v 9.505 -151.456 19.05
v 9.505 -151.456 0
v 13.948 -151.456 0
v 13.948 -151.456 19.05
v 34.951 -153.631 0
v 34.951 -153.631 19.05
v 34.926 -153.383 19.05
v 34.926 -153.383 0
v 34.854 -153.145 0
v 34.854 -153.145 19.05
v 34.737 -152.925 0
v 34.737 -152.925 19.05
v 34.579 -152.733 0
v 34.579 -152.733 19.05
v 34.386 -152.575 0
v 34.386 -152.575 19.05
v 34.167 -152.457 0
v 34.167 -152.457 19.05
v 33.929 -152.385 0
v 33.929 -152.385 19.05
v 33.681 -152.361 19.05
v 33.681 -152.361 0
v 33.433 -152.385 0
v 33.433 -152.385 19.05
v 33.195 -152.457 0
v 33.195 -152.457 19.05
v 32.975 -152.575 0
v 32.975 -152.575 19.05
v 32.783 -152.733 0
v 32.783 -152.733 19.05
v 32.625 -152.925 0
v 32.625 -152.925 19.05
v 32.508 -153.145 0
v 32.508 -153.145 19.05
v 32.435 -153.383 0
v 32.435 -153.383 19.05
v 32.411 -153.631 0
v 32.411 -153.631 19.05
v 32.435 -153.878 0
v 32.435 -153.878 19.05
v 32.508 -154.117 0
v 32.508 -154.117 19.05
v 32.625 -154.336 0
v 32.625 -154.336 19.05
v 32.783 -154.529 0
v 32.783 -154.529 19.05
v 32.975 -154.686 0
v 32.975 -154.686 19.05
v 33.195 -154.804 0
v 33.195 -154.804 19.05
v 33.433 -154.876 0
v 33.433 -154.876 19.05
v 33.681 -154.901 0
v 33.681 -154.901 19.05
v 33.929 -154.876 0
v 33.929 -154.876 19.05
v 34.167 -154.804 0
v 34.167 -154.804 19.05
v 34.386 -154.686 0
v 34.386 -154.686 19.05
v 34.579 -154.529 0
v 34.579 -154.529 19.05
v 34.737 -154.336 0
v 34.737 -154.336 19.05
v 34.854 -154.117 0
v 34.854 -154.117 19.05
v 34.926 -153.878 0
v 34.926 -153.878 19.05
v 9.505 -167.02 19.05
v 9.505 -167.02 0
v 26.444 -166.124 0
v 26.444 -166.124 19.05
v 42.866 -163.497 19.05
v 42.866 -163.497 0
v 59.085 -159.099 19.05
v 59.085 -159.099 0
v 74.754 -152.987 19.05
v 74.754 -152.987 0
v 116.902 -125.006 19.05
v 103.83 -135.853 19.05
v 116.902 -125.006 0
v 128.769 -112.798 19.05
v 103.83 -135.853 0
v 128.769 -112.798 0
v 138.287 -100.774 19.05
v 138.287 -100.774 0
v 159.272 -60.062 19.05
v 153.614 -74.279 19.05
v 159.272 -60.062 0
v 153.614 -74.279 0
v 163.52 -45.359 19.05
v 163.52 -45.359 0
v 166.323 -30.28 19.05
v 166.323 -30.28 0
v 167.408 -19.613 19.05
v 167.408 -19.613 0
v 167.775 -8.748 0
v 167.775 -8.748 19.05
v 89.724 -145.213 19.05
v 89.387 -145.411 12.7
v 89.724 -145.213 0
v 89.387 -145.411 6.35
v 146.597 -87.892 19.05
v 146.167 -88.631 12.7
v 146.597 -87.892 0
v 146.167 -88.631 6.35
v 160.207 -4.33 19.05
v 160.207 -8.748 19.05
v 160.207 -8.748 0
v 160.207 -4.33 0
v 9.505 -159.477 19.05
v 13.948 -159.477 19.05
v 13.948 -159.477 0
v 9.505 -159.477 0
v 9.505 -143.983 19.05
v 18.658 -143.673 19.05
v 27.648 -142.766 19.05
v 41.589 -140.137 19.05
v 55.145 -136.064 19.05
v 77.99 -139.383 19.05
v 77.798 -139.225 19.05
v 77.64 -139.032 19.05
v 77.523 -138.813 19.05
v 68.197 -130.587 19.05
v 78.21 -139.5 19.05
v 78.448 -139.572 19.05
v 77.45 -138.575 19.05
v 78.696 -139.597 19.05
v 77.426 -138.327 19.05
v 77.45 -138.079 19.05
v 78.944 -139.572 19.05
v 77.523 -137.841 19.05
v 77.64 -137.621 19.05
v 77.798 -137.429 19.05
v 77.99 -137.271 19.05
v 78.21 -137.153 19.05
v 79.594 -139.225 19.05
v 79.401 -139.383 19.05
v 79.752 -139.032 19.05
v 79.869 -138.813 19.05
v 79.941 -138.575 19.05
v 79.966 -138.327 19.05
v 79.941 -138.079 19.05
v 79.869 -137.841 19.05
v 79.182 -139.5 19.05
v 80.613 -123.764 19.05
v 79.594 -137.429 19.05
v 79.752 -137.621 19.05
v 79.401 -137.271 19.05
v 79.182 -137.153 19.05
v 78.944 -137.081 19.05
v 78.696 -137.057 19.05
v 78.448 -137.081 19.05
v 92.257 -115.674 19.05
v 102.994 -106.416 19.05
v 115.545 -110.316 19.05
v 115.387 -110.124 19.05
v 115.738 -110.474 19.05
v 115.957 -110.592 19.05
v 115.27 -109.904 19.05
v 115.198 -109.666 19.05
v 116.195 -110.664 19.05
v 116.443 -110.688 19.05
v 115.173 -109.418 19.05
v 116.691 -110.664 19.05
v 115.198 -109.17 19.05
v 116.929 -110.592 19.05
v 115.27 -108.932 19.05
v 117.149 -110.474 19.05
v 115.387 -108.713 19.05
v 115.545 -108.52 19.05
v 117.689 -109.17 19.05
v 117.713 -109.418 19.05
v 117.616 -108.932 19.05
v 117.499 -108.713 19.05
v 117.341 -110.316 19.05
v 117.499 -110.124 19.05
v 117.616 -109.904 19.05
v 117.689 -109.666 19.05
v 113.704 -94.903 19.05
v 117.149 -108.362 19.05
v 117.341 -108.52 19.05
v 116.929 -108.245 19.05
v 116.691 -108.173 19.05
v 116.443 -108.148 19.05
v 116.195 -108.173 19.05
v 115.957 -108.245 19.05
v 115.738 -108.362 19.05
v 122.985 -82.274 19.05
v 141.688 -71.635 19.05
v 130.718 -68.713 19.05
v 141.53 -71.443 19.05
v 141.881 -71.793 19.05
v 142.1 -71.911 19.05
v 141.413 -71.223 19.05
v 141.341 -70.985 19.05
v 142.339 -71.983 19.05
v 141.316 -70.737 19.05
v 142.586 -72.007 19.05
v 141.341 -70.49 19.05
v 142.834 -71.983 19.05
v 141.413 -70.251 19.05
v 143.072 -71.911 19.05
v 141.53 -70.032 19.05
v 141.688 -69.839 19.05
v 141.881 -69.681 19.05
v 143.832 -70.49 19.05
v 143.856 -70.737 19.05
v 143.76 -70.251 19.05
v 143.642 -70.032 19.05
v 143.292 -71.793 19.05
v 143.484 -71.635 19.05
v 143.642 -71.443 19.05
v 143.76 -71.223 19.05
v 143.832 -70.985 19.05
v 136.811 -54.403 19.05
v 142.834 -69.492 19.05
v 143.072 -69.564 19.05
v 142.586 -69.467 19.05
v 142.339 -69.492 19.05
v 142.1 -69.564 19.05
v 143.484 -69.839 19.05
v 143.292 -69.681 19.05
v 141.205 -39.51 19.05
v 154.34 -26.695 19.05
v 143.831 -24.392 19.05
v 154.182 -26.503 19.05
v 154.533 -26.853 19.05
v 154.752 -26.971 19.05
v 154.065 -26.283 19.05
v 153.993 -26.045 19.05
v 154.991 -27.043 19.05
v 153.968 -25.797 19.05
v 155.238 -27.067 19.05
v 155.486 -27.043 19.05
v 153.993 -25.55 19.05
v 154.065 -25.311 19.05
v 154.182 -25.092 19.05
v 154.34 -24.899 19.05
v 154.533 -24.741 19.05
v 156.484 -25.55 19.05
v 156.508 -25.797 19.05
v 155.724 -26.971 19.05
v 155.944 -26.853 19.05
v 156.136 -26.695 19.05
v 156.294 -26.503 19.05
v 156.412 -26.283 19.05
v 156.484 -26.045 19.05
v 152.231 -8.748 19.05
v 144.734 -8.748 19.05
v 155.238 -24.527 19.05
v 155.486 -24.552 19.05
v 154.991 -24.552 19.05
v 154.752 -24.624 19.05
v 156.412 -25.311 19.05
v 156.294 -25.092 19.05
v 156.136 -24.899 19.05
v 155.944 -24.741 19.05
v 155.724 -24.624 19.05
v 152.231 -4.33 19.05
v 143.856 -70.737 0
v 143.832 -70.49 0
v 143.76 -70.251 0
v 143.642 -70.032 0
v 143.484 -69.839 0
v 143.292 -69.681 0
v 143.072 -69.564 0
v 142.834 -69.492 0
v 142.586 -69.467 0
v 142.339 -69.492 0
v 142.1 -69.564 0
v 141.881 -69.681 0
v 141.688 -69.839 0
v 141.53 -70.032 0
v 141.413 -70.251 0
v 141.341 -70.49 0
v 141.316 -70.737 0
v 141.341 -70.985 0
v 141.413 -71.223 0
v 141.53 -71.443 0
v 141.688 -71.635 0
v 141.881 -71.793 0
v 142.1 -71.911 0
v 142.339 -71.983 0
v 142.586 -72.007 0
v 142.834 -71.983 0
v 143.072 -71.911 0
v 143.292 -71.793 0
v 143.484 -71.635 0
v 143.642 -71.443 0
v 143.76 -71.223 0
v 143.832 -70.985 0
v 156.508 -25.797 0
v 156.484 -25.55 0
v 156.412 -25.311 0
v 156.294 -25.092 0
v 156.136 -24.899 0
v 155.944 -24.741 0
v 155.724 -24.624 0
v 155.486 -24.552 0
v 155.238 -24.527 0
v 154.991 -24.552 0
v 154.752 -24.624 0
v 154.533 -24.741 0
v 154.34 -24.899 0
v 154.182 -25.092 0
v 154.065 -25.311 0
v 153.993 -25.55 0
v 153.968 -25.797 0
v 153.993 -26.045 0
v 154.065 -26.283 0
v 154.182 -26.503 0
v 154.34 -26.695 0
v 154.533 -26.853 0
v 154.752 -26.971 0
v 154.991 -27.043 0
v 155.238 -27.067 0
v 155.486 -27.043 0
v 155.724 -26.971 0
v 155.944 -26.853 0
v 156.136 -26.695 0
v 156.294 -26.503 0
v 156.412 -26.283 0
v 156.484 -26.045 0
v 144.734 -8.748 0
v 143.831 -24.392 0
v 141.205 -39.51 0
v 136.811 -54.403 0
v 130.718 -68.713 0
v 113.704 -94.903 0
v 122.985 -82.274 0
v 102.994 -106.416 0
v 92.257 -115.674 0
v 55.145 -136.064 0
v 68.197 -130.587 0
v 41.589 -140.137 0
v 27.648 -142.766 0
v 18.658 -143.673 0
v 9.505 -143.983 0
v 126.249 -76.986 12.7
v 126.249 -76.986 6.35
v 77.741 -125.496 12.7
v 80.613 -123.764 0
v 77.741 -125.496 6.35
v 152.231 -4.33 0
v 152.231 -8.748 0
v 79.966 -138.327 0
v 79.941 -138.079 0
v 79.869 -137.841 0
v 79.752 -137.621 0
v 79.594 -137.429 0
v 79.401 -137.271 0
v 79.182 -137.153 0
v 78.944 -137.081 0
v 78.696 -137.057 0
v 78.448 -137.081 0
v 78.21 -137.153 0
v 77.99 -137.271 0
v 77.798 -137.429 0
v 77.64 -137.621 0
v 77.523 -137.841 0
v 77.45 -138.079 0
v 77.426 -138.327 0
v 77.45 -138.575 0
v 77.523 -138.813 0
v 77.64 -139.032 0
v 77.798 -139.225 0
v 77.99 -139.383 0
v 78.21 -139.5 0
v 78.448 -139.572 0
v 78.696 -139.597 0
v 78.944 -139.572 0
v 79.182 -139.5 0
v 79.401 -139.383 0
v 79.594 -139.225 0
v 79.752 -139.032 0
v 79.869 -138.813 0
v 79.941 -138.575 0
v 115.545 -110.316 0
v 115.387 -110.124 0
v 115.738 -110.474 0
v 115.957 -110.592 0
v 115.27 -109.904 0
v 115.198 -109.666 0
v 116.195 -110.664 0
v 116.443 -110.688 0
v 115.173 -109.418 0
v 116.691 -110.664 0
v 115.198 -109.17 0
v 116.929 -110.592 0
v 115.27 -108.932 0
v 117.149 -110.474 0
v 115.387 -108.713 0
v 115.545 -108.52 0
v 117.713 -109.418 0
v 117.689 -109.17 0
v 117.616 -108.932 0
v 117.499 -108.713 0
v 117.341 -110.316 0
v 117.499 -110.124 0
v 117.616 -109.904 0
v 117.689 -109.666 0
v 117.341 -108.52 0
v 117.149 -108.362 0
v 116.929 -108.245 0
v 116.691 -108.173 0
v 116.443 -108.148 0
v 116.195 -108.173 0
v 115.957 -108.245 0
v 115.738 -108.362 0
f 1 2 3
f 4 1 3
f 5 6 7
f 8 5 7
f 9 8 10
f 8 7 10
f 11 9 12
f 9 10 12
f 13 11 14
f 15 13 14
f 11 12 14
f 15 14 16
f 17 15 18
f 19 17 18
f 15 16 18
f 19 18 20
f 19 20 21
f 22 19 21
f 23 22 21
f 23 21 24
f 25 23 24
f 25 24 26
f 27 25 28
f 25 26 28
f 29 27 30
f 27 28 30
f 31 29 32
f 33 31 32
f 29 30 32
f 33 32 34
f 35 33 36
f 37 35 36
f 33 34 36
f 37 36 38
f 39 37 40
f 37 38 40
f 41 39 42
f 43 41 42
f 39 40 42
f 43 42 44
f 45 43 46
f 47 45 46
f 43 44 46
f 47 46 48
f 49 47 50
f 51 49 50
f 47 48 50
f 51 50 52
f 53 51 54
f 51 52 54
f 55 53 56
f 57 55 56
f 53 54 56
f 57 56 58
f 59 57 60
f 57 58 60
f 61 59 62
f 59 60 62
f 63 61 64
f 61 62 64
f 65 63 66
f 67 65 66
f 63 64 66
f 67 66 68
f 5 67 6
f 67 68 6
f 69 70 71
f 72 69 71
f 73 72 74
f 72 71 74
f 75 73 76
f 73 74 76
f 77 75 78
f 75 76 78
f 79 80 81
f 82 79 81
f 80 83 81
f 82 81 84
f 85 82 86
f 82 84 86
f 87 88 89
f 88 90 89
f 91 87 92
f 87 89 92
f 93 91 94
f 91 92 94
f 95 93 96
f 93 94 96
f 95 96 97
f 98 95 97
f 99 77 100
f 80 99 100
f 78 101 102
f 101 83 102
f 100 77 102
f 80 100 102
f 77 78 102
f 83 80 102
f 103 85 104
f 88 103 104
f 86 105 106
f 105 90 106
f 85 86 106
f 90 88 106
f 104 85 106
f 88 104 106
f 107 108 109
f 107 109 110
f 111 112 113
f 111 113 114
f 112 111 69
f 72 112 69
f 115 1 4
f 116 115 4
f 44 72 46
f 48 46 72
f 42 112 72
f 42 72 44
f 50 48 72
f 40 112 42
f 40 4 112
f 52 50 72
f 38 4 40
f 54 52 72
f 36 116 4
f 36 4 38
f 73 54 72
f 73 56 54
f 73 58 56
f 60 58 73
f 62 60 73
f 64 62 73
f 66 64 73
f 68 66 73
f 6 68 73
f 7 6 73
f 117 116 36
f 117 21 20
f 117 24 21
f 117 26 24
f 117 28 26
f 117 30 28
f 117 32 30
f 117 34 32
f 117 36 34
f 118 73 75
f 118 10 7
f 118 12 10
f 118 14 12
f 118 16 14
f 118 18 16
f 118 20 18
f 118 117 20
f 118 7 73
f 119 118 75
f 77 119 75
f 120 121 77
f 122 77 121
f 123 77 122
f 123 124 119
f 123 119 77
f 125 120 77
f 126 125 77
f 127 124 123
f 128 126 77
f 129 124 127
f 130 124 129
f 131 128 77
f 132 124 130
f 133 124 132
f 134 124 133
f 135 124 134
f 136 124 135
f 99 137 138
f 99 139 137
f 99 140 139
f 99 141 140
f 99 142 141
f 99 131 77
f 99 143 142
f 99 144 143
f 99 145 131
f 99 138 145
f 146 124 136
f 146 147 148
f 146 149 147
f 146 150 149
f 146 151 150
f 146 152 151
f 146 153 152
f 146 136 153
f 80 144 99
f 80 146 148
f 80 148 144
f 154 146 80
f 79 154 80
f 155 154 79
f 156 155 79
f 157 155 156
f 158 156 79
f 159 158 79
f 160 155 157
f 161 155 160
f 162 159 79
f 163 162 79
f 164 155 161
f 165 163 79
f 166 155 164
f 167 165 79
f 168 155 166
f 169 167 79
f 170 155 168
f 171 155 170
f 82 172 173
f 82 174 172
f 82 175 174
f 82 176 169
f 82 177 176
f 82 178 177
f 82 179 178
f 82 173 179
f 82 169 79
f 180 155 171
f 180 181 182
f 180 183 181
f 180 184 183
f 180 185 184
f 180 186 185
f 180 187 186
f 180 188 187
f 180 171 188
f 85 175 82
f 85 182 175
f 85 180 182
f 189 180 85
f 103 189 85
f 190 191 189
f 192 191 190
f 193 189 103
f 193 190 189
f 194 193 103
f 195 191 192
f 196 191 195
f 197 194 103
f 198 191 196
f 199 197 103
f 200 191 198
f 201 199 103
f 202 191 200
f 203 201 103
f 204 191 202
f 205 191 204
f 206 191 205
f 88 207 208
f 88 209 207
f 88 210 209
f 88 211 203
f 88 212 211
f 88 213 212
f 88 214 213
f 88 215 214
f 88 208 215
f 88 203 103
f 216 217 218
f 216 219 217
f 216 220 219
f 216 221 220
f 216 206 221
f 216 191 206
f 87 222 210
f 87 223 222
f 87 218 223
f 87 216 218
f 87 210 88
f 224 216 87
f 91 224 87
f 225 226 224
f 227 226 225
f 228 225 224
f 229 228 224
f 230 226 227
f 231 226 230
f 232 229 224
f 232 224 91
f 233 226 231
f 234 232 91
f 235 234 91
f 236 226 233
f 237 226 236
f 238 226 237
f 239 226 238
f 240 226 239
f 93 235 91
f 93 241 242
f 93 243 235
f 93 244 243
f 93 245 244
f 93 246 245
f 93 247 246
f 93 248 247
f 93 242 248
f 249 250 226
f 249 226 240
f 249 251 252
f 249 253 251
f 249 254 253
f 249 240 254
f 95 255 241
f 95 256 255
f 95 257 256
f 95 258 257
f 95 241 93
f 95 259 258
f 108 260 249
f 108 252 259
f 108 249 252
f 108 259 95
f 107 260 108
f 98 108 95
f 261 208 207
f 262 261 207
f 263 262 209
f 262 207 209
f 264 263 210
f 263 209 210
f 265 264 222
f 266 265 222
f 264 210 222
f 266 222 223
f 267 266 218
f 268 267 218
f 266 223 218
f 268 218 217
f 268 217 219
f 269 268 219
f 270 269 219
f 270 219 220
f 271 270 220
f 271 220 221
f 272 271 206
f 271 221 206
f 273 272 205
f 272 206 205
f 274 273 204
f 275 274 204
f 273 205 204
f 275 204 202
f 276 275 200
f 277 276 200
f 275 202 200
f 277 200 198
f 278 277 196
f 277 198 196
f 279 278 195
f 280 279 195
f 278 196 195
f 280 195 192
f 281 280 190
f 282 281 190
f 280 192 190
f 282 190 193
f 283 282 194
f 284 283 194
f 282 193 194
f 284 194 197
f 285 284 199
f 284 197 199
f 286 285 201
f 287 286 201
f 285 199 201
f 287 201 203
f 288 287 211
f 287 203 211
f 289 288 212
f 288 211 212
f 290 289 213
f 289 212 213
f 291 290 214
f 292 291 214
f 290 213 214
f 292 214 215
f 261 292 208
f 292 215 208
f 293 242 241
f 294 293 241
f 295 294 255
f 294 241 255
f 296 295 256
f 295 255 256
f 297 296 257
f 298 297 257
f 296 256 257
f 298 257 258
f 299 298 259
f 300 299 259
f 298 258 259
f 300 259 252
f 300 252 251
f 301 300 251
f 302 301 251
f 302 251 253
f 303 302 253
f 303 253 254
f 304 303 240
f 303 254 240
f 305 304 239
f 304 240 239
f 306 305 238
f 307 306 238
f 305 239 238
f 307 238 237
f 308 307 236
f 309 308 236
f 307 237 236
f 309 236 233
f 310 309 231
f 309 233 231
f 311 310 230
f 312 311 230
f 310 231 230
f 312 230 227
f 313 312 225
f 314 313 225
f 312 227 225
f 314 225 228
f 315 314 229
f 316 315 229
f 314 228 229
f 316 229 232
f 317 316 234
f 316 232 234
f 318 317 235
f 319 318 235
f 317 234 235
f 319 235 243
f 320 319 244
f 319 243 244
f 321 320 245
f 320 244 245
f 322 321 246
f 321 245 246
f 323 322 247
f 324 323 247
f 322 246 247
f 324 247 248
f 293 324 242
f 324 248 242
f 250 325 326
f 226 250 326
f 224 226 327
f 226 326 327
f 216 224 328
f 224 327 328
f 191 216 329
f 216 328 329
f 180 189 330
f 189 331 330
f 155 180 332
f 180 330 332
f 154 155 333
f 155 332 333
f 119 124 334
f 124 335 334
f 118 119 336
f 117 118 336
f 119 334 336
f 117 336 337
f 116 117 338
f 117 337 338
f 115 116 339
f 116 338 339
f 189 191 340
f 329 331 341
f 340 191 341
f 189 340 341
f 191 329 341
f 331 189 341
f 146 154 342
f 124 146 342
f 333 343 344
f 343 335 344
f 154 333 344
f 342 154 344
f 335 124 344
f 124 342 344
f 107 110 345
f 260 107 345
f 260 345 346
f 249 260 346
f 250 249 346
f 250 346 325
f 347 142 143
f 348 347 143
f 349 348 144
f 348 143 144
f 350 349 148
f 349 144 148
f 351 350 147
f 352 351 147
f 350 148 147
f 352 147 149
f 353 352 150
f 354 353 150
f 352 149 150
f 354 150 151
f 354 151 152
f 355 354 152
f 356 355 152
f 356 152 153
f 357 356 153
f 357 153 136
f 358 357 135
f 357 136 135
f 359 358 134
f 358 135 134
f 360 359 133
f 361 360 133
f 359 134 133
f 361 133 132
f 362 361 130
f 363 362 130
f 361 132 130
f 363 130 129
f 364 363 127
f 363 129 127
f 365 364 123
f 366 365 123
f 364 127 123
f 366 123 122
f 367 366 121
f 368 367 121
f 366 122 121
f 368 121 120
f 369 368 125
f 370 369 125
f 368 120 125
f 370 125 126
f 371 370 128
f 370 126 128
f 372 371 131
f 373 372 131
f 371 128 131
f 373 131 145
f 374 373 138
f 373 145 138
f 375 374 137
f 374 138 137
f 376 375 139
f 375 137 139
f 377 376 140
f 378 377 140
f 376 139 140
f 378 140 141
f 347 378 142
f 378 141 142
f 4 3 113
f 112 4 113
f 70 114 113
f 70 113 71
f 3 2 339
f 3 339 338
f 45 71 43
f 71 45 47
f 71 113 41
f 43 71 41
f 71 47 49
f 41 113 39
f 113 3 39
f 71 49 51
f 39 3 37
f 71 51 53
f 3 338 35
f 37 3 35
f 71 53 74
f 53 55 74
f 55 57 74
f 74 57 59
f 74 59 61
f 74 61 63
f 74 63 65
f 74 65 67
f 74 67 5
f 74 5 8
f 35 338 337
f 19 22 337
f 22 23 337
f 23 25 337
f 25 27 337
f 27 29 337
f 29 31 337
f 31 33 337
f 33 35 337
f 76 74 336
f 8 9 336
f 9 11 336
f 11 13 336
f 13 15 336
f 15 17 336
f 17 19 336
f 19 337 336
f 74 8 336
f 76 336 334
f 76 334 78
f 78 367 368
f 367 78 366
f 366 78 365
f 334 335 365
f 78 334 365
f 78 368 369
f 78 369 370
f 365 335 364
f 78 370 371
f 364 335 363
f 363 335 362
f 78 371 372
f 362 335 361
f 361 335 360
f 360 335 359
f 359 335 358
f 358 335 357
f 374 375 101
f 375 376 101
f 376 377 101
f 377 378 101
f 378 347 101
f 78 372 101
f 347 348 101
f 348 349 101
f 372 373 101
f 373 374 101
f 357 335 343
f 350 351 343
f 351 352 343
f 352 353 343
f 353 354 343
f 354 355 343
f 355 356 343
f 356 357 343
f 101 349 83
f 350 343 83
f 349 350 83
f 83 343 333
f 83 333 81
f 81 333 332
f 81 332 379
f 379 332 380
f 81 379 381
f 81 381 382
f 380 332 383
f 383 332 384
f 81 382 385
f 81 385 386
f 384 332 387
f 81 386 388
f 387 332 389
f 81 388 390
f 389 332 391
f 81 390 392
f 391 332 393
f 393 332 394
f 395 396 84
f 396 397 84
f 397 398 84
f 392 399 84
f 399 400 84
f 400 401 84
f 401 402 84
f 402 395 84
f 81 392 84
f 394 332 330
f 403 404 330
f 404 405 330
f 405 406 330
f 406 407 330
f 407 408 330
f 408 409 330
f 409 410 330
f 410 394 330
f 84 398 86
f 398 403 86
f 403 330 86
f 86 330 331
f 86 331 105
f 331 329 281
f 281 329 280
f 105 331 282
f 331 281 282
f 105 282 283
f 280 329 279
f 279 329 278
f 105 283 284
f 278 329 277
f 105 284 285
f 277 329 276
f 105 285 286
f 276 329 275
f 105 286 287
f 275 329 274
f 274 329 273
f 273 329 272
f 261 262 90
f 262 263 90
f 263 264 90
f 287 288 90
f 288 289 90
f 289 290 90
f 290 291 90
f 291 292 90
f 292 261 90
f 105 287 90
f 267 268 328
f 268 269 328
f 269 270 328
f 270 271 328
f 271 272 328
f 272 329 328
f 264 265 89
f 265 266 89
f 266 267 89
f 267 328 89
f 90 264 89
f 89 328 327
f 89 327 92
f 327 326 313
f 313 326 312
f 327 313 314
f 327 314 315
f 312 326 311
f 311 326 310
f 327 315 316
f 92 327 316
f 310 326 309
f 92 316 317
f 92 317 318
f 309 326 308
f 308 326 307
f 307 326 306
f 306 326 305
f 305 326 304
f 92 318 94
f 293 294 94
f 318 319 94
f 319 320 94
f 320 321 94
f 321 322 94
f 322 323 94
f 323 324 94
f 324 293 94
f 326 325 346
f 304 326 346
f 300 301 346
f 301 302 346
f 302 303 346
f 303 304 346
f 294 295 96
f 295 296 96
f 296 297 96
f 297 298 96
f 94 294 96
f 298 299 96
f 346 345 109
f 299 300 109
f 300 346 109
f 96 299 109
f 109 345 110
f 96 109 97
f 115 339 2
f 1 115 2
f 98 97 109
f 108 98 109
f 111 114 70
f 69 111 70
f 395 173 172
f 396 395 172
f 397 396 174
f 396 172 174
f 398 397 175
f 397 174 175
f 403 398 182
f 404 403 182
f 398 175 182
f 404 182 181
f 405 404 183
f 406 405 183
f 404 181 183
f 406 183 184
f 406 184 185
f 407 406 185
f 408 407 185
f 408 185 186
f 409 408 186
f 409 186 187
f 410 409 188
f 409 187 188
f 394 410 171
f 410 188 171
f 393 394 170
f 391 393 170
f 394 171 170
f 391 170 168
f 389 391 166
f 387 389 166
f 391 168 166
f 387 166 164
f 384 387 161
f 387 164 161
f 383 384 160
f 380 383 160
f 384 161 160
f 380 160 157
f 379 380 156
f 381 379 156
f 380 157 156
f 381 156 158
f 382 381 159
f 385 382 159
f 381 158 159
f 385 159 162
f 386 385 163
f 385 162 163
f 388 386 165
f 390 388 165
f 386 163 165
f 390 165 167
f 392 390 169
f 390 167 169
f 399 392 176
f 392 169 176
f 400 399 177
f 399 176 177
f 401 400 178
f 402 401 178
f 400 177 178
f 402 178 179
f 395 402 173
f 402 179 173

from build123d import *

# Parameters (mm, degrees)
BOSS_EXTRUDE1_DEPTH = 19.05
SKETCH2_R           = 1.27
CUT_EXTRUDE1_DEPTH  = 19.05


with BuildPart() as part:
    # Model → Boss-Extrude1 (new body)
    with BuildSketch(Plane.XY):
        with BuildLine():
            Line((152.231072356, -4.329633855), (152.231072356, -8.748222957))
            Line((152.231072356, -8.748222957), (144.734199957, -8.748222957))
            add(Edge.make_bspline(
                [(144.734199957, -8.748222957), (144.69301384, -83.417421729), (84.173632038, -143.939163421), (9.504929576, -143.982778331)],
                knots=[2, 2, 2, 2, 3, 3, 3, 3], degree=3))
            Line((9.504929576, -143.982778331), (9.504929576, -151.455509223))
            Line((9.504929576, -151.455509223), (13.947661262, -151.455509223))
            Line((13.947661262, -151.455509223), (13.947661262, -159.476656261))
            Line((13.947661262, -159.476656261), (9.504930652, -159.476656261))
            Line((9.504930652, -159.476656261), (9.504930652, -167.019727391))
            add(Edge.make_bspline(
                [(9.504930652, -167.019727391), (96.915292045, -167.019727391), (167.775395098, -96.159159251), (167.775412323, -8.748222419)],
                knots=[8, 8, 8, 8, 9, 9, 9, 9], degree=3))
            Line((167.775412323, -8.748222419), (160.207105868, -8.748222419))
            Line((160.207105868, -8.748222419), (160.207105868, -4.329633855))
            Line((160.207105868, -4.329633855), (152.231072356, -4.329633855))
        make_face()
    extrude(amount=BOSS_EXTRUDE1_DEPTH)

    # Sketch2 → Cut-Extrude1 (cut)
    with BuildSketch(Plane.XY.offset(19.05)):
        with Locations((116.443171089, -109.418222003)):
            Circle(SKETCH2_R)
        with Locations((78.695888831, -138.326762479)):
            Circle(SKETCH2_R)
        with Locations((33.680828367, -153.63053201)):
            Circle(SKETCH2_R)
        with Locations((142.586331098, -70.737364147)):
            Circle(SKETCH2_R)
        with Locations((155.238286937, -25.797386475)):
            Circle(SKETCH2_R)
    extrude(amount=-CUT_EXTRUDE1_DEPTH, mode=Mode.SUBTRACT)


solid = part.part
